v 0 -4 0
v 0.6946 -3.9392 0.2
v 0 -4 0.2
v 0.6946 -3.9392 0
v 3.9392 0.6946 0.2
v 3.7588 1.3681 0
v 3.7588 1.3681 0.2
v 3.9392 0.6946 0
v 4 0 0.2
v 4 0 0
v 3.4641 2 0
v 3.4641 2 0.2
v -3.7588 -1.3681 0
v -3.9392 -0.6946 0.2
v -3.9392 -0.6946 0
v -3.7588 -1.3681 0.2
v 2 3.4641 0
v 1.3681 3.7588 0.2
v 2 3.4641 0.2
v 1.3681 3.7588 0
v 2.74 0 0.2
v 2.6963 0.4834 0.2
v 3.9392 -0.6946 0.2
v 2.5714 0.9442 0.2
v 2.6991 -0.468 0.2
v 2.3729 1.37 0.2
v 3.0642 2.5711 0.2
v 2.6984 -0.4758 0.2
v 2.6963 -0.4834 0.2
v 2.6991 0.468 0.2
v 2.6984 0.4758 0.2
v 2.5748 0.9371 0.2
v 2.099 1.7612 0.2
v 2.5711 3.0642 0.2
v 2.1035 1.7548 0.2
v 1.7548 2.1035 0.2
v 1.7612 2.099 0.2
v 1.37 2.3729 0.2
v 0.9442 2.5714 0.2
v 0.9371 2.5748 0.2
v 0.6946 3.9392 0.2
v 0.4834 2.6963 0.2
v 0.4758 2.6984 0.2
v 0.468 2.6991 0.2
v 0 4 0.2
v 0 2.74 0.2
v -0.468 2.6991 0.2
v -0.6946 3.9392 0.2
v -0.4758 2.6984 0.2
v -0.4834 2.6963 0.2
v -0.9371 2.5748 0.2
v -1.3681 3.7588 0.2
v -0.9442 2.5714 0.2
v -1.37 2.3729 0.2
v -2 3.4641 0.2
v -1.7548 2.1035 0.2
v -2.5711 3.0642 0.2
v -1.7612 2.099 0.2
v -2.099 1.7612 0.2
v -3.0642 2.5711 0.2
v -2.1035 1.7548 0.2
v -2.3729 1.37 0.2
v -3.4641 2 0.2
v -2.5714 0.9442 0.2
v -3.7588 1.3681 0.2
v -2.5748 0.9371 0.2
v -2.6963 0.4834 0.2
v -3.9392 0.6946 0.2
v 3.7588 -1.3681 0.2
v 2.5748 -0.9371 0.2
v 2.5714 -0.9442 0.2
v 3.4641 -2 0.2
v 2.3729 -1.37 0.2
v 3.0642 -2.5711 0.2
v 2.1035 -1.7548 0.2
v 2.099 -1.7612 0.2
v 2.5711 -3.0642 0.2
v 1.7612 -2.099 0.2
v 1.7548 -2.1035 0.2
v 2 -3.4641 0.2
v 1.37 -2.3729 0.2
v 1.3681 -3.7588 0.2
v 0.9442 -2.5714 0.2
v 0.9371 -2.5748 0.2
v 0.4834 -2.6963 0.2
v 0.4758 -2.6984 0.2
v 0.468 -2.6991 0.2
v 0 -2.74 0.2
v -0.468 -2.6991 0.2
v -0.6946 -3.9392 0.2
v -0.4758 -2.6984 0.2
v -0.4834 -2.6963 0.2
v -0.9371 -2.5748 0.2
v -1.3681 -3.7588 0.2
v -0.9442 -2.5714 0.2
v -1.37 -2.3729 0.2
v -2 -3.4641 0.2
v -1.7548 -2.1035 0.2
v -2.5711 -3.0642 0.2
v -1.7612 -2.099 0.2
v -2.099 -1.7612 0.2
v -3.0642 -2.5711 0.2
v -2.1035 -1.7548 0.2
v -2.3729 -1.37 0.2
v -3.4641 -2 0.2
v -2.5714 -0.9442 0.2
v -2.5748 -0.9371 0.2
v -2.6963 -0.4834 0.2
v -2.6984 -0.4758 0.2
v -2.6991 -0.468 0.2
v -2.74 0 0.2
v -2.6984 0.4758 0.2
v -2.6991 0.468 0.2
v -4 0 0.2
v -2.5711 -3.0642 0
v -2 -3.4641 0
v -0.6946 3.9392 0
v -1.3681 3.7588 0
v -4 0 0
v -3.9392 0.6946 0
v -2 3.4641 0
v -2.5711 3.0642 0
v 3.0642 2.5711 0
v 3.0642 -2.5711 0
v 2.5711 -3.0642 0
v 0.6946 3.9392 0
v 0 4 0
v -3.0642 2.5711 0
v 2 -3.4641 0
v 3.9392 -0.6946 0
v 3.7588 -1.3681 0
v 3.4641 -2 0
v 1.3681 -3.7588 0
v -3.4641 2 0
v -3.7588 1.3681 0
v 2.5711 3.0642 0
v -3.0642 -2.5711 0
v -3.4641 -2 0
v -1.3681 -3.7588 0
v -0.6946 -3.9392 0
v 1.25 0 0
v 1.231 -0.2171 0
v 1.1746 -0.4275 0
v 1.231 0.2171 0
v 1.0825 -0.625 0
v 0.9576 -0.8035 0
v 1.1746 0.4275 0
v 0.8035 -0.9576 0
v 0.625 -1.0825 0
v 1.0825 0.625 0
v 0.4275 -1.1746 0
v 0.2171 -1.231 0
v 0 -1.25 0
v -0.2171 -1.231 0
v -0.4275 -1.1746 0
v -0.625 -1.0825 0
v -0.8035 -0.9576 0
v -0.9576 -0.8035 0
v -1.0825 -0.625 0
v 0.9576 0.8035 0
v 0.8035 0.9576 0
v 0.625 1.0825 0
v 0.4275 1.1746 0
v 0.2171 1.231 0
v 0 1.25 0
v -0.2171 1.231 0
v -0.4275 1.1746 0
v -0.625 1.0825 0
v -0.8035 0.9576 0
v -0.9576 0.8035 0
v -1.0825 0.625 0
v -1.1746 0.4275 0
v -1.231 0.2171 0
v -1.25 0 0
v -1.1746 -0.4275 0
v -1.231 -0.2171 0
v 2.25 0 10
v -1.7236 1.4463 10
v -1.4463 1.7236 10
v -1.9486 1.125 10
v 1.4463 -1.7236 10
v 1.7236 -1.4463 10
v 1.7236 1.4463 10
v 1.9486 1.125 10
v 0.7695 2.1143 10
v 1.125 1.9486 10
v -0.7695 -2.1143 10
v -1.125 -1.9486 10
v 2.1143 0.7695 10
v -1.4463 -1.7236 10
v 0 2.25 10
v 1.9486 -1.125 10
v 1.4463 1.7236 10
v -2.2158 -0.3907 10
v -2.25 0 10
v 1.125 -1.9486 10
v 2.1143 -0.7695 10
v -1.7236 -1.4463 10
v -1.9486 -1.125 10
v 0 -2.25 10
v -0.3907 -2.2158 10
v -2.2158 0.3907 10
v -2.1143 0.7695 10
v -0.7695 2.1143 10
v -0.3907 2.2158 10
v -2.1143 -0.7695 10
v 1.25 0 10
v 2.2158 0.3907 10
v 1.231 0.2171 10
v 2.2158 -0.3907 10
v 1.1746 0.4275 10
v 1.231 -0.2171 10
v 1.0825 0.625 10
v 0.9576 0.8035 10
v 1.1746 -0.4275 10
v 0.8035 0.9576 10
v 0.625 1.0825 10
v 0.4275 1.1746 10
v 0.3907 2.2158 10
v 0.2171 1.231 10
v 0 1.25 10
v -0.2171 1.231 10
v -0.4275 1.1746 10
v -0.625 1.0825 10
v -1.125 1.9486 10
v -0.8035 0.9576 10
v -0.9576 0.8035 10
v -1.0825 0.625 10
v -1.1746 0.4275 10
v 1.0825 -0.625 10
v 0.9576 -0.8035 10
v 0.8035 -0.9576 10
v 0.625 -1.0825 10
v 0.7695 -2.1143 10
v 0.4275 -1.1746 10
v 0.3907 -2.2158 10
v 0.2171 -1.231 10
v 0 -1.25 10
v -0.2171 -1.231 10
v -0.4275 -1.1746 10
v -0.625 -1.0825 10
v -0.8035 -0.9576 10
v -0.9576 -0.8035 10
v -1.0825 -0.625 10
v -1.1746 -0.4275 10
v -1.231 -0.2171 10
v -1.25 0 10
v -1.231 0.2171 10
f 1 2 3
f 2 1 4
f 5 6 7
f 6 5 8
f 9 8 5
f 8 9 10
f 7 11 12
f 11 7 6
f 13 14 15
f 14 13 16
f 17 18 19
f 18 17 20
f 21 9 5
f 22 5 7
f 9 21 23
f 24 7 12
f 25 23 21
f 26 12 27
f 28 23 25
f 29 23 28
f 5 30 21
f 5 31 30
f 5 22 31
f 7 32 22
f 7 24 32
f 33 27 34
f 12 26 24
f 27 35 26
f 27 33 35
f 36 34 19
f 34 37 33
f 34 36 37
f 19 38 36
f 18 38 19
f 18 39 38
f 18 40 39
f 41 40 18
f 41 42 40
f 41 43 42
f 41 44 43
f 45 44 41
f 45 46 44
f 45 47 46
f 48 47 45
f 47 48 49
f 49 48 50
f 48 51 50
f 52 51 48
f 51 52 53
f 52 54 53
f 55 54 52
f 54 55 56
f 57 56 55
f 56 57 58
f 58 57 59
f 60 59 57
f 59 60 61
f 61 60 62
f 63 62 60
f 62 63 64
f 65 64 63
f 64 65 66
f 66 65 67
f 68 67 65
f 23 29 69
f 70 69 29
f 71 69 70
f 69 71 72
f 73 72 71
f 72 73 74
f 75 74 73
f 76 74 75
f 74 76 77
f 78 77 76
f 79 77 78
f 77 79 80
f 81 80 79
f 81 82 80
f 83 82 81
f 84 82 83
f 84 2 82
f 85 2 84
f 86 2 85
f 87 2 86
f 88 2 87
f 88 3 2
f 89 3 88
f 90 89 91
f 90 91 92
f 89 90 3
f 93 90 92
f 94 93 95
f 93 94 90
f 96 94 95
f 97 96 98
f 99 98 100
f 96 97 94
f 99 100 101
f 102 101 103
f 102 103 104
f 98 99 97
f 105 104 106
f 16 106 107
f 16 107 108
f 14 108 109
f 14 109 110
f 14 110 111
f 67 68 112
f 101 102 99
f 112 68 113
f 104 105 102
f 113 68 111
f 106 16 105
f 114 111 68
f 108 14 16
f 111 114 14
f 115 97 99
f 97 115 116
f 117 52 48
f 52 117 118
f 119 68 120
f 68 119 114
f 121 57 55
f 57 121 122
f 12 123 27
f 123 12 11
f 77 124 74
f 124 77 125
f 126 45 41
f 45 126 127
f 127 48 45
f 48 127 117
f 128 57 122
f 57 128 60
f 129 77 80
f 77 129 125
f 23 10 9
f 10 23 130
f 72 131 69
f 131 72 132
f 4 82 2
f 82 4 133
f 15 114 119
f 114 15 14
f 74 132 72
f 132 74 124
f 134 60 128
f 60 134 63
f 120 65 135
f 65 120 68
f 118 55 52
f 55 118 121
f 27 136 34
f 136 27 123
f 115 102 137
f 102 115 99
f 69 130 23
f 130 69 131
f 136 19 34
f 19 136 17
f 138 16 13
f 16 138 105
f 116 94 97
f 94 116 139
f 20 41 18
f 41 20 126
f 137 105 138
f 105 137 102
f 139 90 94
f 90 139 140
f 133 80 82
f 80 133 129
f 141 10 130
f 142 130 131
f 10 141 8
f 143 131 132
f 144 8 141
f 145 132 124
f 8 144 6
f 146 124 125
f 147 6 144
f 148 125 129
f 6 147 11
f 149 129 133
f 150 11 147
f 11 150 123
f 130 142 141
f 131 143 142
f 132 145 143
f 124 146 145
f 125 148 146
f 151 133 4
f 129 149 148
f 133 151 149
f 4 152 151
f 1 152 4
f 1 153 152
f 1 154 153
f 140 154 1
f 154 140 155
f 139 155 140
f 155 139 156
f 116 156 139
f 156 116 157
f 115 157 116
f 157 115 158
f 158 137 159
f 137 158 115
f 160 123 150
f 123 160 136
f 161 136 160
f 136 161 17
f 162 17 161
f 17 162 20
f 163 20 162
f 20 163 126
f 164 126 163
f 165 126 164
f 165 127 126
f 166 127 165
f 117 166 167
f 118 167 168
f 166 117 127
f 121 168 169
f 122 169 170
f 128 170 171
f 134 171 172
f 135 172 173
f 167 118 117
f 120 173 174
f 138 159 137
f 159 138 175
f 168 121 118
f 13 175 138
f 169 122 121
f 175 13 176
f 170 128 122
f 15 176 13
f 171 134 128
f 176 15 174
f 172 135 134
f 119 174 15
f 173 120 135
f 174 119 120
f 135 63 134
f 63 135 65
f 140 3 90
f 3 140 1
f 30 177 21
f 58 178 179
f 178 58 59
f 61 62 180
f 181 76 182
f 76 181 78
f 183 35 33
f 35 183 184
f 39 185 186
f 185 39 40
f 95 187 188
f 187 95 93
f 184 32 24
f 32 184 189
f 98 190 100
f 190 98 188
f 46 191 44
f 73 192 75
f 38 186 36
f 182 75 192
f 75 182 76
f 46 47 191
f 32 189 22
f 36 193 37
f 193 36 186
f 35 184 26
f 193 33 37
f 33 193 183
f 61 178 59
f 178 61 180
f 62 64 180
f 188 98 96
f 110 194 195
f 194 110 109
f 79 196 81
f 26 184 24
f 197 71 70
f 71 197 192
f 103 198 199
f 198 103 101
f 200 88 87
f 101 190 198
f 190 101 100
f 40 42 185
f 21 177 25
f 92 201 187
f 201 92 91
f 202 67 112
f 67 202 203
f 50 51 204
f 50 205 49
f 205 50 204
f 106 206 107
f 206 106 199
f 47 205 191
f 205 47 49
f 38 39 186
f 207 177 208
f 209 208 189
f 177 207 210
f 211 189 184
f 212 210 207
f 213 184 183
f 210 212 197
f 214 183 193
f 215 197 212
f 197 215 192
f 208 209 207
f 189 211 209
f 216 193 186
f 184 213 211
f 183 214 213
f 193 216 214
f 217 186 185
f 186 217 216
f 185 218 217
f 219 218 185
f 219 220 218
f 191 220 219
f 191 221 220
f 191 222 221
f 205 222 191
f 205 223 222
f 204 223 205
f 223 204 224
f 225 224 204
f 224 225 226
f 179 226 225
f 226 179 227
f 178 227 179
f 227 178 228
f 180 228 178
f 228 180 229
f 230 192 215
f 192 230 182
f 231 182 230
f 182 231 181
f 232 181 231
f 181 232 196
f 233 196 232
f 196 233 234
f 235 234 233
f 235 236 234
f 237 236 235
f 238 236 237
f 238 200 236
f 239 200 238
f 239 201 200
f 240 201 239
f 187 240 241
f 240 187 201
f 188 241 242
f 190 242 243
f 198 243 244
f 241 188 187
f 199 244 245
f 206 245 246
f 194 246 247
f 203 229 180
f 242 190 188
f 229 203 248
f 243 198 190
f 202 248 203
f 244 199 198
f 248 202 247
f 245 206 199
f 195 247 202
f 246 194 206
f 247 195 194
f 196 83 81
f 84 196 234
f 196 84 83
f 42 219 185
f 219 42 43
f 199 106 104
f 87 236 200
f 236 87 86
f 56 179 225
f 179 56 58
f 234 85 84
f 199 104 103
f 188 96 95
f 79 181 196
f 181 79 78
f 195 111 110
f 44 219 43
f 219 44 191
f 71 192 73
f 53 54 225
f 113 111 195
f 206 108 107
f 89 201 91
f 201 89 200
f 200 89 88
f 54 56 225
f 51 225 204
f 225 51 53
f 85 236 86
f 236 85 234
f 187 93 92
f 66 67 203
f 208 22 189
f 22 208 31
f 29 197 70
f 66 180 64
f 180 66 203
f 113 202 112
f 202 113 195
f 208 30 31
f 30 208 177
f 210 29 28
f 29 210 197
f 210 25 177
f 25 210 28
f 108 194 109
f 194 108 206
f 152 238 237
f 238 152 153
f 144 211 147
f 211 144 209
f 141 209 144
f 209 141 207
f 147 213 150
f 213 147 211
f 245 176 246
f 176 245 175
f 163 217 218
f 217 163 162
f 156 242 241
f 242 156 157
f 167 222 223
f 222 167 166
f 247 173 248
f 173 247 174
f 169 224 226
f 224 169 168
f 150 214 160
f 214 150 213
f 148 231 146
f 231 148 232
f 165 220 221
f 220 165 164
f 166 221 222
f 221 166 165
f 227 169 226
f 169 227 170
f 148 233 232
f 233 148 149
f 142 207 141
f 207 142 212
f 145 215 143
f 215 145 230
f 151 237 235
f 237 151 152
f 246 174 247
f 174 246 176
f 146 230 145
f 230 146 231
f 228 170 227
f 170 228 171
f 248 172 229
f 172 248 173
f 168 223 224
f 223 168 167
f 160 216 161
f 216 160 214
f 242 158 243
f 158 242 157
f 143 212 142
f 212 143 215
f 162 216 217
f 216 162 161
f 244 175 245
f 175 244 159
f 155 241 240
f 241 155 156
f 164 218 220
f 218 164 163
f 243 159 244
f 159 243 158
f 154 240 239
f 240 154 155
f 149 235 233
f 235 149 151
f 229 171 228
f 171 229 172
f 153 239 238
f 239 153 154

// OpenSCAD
difference(){
union(){
cylinder(r=4,h=0.2,$fn=36);
cylinder(r1=2.75,r2=2.25,h=10,$fn=36);}
translate([0,0,-1])cylinder(r=1.25,h=20,$fn=36);}
